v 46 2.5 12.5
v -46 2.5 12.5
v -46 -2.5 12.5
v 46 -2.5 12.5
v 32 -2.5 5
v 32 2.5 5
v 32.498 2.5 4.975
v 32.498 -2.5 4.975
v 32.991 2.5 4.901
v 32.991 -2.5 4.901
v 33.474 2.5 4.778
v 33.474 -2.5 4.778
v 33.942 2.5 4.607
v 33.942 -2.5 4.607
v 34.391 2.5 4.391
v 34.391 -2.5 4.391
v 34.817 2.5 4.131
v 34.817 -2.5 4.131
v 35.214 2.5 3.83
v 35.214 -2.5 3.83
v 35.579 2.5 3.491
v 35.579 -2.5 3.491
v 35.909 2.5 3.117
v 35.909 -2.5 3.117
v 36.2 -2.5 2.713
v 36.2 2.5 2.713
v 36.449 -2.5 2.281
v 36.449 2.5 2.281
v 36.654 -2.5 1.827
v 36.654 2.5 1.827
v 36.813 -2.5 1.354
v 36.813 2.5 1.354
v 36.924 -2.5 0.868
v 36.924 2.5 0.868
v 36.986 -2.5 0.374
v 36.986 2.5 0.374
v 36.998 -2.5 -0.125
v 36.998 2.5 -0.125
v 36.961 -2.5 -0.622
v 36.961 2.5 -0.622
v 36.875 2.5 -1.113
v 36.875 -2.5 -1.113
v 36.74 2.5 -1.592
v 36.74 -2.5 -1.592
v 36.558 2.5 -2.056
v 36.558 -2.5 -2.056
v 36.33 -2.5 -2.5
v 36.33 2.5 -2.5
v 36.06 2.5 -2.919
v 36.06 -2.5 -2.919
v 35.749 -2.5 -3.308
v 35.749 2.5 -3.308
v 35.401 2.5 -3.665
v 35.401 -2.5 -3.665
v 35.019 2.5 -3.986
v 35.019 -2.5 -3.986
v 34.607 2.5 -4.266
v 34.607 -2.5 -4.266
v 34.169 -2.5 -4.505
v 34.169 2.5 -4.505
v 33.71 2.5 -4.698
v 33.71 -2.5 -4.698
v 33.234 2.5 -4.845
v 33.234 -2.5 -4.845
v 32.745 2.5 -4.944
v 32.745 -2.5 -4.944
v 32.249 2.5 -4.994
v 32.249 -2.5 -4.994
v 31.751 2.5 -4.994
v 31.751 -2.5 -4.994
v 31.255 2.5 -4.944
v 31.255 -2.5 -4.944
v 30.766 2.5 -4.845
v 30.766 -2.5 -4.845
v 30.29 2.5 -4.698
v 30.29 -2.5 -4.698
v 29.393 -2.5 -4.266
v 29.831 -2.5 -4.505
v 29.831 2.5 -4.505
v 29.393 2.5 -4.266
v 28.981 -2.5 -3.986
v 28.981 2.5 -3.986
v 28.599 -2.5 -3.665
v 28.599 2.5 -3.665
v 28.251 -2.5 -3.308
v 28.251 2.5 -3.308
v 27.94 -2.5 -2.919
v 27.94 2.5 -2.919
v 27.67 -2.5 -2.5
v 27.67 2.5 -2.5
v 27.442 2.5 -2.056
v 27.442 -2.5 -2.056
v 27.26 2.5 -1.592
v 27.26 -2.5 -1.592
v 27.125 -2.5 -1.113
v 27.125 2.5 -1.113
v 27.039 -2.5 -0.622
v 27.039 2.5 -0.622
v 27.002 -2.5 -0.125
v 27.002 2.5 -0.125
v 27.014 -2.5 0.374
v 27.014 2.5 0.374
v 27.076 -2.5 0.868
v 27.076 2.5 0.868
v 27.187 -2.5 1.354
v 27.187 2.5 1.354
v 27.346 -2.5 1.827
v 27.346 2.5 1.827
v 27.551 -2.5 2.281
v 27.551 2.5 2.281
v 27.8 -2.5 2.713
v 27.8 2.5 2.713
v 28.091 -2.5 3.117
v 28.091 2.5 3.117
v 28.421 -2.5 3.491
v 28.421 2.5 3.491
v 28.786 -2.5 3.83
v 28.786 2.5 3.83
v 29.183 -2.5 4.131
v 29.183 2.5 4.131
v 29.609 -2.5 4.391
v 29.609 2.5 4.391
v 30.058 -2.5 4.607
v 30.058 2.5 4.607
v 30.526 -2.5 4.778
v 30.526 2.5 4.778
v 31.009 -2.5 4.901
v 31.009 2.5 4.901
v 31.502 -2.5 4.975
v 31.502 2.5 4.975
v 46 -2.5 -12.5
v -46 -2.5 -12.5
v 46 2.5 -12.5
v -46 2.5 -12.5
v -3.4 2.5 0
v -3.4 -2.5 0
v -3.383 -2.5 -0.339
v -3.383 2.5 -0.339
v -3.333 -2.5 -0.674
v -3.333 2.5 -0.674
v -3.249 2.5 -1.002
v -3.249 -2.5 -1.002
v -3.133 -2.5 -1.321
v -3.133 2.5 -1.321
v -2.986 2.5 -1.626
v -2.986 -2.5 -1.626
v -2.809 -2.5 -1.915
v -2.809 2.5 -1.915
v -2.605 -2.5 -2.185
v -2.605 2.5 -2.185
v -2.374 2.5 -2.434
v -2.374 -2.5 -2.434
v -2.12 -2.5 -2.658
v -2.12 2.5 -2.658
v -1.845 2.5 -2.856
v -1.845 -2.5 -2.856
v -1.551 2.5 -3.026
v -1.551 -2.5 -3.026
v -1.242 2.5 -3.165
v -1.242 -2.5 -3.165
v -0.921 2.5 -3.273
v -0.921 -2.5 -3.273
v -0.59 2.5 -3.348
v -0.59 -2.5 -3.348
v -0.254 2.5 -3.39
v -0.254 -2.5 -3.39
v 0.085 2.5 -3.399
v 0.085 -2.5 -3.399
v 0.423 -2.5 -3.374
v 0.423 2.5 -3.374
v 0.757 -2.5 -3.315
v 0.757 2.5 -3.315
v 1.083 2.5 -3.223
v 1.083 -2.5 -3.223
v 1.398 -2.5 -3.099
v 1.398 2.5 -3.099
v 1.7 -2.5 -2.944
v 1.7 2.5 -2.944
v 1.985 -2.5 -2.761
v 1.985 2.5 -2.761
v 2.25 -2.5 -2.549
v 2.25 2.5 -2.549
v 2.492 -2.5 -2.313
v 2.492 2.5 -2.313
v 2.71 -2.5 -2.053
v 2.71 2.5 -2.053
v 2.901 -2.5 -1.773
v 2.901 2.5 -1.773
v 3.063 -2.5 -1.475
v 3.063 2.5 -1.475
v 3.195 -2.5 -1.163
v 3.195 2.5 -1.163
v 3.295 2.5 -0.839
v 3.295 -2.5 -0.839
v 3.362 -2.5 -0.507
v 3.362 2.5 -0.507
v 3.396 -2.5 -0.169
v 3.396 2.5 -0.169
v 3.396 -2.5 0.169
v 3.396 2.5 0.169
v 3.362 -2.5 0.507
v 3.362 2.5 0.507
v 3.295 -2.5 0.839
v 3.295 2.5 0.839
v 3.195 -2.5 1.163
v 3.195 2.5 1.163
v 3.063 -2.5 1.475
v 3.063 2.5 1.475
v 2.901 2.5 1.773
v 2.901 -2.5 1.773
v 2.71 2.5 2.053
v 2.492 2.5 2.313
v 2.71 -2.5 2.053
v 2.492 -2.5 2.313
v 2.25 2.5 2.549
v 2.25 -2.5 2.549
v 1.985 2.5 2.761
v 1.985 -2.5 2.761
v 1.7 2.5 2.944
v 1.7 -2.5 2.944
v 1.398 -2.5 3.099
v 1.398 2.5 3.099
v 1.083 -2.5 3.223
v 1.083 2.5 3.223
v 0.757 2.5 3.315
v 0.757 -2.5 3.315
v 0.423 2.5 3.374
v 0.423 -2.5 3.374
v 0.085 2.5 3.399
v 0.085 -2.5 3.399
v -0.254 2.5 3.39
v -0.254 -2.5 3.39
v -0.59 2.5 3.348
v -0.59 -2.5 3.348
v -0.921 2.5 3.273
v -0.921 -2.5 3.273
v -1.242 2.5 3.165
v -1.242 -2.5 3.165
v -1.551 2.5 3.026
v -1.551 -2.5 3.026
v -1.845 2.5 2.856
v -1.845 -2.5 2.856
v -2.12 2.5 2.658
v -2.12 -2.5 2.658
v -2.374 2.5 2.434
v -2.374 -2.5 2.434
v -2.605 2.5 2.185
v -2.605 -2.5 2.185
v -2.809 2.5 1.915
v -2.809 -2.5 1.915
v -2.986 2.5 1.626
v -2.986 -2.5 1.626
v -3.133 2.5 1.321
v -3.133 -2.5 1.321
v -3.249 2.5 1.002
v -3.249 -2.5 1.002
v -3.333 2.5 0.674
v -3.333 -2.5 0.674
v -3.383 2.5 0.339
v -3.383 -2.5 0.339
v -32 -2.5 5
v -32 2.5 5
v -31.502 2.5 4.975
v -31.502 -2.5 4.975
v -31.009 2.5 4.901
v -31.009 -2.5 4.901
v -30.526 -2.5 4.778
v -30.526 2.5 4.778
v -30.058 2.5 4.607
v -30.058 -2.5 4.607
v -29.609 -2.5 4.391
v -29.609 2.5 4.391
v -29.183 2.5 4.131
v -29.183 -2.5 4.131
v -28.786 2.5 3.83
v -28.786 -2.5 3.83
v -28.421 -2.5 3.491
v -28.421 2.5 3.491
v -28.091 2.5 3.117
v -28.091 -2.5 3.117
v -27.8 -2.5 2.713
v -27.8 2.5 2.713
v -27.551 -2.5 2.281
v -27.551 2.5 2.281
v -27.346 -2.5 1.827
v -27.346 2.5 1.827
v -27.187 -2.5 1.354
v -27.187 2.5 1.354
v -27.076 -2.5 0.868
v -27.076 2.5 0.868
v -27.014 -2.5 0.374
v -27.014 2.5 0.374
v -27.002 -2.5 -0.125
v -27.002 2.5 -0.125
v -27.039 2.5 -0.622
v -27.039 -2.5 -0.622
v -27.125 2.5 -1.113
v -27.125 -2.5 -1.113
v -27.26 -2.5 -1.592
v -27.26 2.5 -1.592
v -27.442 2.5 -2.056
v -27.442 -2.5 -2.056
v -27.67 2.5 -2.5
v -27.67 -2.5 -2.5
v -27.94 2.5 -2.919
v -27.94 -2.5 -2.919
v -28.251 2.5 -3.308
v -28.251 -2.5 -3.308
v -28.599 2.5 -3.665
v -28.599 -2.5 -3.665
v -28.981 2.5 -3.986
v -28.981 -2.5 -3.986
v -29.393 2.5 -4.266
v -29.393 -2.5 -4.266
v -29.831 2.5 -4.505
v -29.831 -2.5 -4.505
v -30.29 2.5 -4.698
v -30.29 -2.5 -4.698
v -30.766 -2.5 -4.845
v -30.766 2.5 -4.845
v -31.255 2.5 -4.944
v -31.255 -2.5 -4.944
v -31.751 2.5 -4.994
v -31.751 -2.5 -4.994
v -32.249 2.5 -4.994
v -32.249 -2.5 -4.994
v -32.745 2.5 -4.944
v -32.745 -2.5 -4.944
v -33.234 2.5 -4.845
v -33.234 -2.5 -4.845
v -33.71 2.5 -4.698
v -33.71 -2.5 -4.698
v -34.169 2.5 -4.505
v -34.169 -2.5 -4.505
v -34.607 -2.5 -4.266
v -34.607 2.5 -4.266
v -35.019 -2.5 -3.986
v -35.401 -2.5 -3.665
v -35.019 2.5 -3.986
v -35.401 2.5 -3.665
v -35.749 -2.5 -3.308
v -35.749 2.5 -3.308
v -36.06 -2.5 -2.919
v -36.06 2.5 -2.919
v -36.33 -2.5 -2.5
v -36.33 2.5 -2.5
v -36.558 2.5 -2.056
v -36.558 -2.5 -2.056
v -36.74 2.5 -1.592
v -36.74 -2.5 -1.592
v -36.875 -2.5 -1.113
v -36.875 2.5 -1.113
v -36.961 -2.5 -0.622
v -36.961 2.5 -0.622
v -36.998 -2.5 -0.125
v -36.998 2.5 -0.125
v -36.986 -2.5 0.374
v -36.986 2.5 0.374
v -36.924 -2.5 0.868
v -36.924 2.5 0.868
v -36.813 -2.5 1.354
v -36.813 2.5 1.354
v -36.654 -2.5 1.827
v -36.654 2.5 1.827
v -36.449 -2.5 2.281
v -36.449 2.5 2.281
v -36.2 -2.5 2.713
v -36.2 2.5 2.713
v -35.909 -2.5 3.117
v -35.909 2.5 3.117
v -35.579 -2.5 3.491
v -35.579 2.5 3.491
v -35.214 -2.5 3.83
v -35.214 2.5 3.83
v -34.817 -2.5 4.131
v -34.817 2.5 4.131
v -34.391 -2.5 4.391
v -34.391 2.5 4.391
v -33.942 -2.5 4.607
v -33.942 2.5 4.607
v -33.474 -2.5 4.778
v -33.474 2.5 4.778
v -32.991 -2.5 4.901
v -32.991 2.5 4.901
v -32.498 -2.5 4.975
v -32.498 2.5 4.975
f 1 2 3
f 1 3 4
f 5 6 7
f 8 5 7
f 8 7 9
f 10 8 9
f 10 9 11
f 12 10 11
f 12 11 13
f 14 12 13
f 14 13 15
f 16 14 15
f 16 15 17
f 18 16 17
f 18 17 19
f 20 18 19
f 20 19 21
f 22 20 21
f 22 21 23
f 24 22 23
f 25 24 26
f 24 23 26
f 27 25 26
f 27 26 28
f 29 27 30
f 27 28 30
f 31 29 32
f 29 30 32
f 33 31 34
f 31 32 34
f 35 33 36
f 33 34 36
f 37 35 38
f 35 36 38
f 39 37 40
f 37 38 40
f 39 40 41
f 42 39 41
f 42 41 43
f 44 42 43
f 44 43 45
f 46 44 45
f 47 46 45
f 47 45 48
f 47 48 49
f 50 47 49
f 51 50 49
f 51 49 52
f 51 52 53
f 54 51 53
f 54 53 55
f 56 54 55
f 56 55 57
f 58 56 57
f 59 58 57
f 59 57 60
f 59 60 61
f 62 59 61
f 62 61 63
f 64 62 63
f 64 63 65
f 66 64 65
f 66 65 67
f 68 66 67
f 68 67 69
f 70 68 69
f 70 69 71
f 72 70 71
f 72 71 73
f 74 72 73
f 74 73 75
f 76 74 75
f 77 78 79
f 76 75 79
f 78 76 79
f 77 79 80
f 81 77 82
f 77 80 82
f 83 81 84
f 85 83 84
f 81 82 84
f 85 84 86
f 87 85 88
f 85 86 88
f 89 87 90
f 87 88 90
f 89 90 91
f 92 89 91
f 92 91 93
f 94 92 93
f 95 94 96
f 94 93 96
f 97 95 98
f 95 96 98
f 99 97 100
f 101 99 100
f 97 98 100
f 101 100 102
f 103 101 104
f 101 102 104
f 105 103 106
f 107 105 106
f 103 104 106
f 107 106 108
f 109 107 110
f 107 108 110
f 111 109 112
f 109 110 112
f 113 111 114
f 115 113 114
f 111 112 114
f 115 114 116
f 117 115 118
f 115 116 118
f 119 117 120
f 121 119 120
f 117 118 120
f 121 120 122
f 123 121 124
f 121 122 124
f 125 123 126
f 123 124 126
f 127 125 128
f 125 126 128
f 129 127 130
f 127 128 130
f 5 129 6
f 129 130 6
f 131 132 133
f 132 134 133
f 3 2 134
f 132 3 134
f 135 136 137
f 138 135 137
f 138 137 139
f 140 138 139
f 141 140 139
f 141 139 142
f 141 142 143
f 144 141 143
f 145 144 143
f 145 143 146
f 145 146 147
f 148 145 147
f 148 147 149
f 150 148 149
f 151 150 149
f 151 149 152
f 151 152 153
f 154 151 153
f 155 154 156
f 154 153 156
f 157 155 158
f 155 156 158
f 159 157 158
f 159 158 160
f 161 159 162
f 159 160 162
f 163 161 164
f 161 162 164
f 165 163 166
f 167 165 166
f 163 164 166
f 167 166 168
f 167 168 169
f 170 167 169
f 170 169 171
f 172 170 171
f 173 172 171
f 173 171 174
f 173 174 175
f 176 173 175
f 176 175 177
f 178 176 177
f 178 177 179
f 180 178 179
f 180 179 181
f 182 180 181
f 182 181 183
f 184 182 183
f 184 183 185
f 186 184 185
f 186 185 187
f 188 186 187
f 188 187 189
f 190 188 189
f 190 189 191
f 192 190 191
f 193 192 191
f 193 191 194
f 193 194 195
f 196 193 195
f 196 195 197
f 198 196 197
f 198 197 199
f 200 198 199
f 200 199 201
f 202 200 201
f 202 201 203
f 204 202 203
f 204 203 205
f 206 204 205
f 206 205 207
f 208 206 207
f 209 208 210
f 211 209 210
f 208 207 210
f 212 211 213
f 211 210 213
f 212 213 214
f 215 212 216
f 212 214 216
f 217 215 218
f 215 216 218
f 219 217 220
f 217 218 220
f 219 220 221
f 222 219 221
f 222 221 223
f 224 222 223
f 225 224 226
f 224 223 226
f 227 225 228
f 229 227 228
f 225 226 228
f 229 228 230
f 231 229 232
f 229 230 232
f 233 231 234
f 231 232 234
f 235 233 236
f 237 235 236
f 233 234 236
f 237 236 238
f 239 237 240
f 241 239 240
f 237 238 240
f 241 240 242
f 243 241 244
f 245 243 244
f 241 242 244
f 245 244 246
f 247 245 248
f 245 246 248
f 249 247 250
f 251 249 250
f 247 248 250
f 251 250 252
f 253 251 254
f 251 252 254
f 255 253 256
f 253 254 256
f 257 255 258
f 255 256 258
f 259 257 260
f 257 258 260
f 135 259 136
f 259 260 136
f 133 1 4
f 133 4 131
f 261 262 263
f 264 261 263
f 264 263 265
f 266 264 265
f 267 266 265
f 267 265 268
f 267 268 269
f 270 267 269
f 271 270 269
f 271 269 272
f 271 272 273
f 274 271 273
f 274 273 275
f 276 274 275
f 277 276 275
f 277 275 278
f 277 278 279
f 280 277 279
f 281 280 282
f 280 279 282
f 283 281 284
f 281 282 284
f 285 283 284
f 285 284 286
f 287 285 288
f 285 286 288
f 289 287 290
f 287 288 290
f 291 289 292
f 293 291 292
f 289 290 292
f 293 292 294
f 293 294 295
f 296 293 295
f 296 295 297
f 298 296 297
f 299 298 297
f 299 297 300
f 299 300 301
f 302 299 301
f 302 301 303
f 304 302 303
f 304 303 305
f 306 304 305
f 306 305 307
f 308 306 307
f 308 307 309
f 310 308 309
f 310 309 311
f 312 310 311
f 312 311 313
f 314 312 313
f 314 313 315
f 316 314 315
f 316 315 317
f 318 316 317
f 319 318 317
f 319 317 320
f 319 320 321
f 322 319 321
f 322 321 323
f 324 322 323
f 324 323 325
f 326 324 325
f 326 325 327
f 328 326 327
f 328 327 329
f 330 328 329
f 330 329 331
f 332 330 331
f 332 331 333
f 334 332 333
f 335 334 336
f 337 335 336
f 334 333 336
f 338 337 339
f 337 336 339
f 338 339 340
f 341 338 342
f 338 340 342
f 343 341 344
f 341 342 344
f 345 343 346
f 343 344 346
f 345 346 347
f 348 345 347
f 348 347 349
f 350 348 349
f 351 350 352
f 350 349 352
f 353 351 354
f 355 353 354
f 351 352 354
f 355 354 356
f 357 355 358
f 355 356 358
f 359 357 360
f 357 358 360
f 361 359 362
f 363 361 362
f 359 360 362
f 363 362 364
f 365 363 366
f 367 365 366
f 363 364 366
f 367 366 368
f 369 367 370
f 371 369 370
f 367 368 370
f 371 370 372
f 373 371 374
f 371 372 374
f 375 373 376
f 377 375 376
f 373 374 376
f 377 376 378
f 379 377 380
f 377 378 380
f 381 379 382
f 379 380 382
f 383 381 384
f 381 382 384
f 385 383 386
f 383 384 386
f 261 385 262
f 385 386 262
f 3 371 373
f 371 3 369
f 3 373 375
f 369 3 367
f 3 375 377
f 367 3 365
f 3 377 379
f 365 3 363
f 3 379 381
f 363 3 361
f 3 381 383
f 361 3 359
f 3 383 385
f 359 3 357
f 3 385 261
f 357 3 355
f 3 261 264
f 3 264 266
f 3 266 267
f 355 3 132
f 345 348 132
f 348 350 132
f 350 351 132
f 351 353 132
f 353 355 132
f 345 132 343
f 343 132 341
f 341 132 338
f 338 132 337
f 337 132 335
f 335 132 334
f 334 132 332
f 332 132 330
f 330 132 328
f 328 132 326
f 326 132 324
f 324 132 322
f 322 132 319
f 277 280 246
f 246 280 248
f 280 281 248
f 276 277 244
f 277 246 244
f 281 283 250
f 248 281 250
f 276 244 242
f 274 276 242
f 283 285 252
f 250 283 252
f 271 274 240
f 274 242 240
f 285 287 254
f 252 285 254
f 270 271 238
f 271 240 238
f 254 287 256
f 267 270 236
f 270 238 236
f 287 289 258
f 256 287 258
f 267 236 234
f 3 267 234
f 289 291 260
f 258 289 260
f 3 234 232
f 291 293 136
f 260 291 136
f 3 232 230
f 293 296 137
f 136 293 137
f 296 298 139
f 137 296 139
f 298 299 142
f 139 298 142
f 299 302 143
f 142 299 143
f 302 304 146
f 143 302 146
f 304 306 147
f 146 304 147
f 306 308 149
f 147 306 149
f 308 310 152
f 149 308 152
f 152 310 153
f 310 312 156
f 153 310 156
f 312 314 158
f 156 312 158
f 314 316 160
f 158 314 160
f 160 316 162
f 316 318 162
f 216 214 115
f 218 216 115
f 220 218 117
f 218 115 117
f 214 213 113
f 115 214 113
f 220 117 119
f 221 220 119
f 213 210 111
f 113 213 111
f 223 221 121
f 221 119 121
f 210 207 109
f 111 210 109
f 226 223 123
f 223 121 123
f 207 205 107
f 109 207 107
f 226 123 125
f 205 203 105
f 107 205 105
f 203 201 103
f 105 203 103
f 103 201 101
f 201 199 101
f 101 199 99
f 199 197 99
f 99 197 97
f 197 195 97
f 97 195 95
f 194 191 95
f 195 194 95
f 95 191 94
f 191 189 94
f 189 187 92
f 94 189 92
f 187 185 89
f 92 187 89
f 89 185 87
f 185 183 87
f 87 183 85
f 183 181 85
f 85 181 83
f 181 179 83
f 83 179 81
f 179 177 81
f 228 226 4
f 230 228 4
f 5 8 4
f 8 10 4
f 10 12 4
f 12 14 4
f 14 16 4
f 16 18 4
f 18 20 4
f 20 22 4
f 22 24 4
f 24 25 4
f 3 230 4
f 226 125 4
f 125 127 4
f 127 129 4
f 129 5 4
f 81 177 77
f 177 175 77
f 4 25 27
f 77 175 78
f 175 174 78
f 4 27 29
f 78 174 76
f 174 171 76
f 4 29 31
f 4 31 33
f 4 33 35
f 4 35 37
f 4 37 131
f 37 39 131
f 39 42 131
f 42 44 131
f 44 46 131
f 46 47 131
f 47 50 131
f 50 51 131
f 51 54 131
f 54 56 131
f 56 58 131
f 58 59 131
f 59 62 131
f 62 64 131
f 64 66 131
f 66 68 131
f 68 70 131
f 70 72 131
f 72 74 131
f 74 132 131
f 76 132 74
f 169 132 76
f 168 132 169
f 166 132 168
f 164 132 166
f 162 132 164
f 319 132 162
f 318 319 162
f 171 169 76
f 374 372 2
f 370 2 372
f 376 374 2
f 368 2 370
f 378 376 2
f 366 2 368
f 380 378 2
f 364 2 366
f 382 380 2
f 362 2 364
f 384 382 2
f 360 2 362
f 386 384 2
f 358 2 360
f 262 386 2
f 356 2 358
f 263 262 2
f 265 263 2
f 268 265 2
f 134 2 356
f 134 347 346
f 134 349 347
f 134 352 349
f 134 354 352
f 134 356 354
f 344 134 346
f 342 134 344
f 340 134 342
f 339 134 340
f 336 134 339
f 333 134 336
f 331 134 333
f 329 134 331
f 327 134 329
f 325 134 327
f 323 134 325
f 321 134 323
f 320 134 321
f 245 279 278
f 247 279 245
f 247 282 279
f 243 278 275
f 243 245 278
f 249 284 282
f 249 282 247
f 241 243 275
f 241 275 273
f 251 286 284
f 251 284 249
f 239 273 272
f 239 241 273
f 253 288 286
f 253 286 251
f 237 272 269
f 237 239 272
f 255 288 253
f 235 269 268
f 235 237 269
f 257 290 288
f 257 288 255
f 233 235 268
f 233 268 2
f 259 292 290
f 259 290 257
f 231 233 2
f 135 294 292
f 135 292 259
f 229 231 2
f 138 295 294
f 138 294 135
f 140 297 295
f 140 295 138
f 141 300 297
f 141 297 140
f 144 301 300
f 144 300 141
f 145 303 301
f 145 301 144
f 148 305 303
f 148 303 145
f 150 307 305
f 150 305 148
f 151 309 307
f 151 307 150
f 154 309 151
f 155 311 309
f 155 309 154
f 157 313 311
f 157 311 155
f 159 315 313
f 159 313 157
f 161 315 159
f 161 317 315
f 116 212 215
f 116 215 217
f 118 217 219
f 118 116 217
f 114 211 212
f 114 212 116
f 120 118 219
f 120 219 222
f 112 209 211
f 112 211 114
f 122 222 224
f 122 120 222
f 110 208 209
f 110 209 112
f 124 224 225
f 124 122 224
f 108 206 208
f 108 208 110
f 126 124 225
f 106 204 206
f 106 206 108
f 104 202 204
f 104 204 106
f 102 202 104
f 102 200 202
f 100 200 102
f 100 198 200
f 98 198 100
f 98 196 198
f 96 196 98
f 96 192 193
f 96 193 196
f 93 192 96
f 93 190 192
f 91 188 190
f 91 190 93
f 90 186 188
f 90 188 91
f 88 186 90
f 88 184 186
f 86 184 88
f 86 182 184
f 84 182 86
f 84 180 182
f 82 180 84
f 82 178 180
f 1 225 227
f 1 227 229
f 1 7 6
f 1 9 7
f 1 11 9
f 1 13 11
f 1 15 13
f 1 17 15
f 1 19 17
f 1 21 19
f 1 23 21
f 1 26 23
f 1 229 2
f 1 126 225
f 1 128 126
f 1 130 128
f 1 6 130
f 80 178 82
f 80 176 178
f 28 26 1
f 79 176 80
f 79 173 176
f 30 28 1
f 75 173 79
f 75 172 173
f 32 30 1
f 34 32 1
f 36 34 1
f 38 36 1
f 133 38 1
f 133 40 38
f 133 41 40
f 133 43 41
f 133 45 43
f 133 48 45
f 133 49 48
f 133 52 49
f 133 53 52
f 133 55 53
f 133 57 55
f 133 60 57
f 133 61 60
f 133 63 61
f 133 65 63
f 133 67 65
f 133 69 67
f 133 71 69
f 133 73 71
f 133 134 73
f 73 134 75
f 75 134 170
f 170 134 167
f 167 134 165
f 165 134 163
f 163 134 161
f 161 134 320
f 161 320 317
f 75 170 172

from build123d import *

# Parameters (mm, degrees)
SKETCH_1_W          = 92
SKETCH_1_H          = 25
EXTRUDE_1_DEPTH     = 2.5
SKETCH_2_R          = 5
CUT_EXTRUDE_1_DEPTH = 48.929635926
HOLE_WIZARD_M8_1_D  = 6.8


with BuildPart() as part:
    # 草图1 → 凸台-拉伸1 (new, symmetric)
    with BuildSketch(Plane(origin=(0, 0, 0), x_dir=(1, 0, 0), z_dir=(0, 1, 0))):
        Rectangle(SKETCH_1_W, SKETCH_1_H)
    extrude(amount=EXTRUDE_1_DEPTH, both=True)

    # 草图2 → 切除-拉伸1 (cut, through all)
    with BuildSketch(Plane(origin=(0, 2.5, 0), x_dir=(1, 0, 0), z_dir=(0, 1, 0))):
        with Locations(Location((32, 0, 0), (0, 0, 270))):
            Circle(SKETCH_2_R)
        with Locations(Location((-32, 0, 0), (0, 0, 270))):
            Circle(SKETCH_2_R)
    extrude(amount=-CUT_EXTRUDE_1_DEPTH, mode=Mode.SUBTRACT)

    # M8 螺纹孔1 (through all)
    with Locations(Plane(origin=(0, 2.5, 0), x_dir=(1, 0, 0), z_dir=(0, 1, 0))):
        with Locations((0, 0)):
            Hole(HOLE_WIZARD_M8_1_D / 2)


solid = part.part
